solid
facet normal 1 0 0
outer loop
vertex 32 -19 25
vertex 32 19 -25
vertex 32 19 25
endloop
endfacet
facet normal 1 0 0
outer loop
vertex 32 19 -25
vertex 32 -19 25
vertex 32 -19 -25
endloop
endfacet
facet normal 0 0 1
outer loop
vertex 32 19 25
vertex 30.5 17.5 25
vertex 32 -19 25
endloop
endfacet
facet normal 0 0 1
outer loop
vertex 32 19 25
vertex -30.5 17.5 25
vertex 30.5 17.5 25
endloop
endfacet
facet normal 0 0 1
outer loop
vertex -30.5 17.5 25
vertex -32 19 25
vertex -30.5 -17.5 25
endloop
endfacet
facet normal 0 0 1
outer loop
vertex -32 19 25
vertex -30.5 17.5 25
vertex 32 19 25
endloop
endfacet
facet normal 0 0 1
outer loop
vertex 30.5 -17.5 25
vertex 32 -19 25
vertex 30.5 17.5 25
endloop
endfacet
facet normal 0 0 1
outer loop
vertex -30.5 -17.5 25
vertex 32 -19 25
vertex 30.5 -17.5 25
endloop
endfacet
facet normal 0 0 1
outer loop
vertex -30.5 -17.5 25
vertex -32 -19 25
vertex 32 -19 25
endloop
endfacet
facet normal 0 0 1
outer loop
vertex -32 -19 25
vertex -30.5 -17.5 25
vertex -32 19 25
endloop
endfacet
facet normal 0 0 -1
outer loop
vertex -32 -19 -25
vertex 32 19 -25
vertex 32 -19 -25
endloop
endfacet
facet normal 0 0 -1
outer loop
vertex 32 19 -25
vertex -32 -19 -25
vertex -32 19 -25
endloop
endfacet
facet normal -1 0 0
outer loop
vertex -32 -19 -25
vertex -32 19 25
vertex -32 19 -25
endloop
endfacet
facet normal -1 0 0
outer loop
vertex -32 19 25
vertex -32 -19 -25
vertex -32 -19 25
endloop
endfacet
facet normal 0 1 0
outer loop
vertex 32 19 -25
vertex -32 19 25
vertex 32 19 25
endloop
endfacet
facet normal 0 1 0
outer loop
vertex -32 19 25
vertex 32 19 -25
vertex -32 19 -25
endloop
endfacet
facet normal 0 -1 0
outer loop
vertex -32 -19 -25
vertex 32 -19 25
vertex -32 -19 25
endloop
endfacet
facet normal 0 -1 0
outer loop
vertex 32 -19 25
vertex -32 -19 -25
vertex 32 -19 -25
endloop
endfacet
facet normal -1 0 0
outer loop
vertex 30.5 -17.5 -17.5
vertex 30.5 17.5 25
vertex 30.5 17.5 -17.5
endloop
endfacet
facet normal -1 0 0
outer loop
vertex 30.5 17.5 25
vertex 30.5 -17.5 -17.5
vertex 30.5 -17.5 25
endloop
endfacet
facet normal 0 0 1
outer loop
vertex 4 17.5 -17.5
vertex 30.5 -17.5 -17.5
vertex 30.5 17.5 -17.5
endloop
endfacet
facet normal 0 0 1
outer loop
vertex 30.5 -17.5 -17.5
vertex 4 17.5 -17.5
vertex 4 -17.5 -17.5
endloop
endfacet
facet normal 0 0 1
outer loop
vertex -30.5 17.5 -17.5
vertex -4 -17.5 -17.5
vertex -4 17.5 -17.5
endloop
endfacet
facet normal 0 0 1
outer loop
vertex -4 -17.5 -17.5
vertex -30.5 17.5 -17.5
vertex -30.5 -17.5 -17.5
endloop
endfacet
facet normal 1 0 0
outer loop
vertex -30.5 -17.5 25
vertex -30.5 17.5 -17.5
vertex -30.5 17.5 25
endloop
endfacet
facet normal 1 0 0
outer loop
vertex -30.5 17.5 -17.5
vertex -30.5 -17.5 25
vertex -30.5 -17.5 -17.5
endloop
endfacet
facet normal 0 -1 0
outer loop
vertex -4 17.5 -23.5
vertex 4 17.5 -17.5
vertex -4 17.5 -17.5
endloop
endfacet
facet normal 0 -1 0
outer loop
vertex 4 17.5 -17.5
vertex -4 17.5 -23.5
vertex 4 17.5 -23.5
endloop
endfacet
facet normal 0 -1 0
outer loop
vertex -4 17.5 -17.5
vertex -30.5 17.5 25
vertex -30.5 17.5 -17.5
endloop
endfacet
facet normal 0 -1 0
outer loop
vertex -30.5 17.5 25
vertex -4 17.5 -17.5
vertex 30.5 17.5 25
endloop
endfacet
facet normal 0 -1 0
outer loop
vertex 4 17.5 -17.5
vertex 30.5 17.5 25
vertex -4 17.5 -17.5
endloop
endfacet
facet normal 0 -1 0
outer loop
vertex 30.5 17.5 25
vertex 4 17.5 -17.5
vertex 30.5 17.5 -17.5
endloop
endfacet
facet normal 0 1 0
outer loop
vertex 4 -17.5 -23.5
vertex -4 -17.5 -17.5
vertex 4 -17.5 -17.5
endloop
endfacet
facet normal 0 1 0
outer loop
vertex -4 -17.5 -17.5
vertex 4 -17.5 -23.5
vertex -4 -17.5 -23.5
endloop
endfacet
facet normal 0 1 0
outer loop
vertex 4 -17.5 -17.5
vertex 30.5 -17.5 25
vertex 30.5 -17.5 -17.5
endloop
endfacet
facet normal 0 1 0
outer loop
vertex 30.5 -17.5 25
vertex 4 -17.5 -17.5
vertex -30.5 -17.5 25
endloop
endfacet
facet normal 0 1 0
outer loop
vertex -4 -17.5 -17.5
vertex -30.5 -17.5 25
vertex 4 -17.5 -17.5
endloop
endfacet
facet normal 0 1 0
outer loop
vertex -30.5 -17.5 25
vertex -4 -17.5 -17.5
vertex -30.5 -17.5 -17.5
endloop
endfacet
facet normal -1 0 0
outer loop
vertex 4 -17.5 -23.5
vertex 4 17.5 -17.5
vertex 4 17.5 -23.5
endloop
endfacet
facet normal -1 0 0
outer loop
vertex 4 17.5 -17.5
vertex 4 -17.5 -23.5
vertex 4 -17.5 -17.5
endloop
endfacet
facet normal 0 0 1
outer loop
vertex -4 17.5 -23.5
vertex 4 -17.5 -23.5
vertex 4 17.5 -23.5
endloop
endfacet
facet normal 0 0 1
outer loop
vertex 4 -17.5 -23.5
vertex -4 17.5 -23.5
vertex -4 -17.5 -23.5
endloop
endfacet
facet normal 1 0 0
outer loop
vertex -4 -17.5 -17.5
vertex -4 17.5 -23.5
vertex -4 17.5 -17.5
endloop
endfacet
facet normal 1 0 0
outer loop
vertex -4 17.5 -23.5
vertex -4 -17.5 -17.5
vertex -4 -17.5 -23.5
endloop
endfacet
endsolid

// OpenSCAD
// Largeur 60/85?/120
width = 60;
width_margin = 1;

// Profondeur
depth = 30;
depth_margin = 5;

// Standart 50, petite 25
height = 50;

wall = 1.5;

trench = true;
trench_h = 6;
trench_w = 8;

// fin des parametres


inner = [width+width_margin, depth+depth_margin, height];
outter = [width+width_margin+wall*2, depth+depth_margin+wall*2, height];
trench_box = [trench_w, depth+depth_margin, trench_h];

difference() {
	cube(outter, true);
	translate([0,0,wall+(trench?trench_h:0)])
		cube(inner, true);
	if (trench)
		translate([0,0,-height/2+trench_h/2+wall])
			cube(trench_box, center=true);
}
